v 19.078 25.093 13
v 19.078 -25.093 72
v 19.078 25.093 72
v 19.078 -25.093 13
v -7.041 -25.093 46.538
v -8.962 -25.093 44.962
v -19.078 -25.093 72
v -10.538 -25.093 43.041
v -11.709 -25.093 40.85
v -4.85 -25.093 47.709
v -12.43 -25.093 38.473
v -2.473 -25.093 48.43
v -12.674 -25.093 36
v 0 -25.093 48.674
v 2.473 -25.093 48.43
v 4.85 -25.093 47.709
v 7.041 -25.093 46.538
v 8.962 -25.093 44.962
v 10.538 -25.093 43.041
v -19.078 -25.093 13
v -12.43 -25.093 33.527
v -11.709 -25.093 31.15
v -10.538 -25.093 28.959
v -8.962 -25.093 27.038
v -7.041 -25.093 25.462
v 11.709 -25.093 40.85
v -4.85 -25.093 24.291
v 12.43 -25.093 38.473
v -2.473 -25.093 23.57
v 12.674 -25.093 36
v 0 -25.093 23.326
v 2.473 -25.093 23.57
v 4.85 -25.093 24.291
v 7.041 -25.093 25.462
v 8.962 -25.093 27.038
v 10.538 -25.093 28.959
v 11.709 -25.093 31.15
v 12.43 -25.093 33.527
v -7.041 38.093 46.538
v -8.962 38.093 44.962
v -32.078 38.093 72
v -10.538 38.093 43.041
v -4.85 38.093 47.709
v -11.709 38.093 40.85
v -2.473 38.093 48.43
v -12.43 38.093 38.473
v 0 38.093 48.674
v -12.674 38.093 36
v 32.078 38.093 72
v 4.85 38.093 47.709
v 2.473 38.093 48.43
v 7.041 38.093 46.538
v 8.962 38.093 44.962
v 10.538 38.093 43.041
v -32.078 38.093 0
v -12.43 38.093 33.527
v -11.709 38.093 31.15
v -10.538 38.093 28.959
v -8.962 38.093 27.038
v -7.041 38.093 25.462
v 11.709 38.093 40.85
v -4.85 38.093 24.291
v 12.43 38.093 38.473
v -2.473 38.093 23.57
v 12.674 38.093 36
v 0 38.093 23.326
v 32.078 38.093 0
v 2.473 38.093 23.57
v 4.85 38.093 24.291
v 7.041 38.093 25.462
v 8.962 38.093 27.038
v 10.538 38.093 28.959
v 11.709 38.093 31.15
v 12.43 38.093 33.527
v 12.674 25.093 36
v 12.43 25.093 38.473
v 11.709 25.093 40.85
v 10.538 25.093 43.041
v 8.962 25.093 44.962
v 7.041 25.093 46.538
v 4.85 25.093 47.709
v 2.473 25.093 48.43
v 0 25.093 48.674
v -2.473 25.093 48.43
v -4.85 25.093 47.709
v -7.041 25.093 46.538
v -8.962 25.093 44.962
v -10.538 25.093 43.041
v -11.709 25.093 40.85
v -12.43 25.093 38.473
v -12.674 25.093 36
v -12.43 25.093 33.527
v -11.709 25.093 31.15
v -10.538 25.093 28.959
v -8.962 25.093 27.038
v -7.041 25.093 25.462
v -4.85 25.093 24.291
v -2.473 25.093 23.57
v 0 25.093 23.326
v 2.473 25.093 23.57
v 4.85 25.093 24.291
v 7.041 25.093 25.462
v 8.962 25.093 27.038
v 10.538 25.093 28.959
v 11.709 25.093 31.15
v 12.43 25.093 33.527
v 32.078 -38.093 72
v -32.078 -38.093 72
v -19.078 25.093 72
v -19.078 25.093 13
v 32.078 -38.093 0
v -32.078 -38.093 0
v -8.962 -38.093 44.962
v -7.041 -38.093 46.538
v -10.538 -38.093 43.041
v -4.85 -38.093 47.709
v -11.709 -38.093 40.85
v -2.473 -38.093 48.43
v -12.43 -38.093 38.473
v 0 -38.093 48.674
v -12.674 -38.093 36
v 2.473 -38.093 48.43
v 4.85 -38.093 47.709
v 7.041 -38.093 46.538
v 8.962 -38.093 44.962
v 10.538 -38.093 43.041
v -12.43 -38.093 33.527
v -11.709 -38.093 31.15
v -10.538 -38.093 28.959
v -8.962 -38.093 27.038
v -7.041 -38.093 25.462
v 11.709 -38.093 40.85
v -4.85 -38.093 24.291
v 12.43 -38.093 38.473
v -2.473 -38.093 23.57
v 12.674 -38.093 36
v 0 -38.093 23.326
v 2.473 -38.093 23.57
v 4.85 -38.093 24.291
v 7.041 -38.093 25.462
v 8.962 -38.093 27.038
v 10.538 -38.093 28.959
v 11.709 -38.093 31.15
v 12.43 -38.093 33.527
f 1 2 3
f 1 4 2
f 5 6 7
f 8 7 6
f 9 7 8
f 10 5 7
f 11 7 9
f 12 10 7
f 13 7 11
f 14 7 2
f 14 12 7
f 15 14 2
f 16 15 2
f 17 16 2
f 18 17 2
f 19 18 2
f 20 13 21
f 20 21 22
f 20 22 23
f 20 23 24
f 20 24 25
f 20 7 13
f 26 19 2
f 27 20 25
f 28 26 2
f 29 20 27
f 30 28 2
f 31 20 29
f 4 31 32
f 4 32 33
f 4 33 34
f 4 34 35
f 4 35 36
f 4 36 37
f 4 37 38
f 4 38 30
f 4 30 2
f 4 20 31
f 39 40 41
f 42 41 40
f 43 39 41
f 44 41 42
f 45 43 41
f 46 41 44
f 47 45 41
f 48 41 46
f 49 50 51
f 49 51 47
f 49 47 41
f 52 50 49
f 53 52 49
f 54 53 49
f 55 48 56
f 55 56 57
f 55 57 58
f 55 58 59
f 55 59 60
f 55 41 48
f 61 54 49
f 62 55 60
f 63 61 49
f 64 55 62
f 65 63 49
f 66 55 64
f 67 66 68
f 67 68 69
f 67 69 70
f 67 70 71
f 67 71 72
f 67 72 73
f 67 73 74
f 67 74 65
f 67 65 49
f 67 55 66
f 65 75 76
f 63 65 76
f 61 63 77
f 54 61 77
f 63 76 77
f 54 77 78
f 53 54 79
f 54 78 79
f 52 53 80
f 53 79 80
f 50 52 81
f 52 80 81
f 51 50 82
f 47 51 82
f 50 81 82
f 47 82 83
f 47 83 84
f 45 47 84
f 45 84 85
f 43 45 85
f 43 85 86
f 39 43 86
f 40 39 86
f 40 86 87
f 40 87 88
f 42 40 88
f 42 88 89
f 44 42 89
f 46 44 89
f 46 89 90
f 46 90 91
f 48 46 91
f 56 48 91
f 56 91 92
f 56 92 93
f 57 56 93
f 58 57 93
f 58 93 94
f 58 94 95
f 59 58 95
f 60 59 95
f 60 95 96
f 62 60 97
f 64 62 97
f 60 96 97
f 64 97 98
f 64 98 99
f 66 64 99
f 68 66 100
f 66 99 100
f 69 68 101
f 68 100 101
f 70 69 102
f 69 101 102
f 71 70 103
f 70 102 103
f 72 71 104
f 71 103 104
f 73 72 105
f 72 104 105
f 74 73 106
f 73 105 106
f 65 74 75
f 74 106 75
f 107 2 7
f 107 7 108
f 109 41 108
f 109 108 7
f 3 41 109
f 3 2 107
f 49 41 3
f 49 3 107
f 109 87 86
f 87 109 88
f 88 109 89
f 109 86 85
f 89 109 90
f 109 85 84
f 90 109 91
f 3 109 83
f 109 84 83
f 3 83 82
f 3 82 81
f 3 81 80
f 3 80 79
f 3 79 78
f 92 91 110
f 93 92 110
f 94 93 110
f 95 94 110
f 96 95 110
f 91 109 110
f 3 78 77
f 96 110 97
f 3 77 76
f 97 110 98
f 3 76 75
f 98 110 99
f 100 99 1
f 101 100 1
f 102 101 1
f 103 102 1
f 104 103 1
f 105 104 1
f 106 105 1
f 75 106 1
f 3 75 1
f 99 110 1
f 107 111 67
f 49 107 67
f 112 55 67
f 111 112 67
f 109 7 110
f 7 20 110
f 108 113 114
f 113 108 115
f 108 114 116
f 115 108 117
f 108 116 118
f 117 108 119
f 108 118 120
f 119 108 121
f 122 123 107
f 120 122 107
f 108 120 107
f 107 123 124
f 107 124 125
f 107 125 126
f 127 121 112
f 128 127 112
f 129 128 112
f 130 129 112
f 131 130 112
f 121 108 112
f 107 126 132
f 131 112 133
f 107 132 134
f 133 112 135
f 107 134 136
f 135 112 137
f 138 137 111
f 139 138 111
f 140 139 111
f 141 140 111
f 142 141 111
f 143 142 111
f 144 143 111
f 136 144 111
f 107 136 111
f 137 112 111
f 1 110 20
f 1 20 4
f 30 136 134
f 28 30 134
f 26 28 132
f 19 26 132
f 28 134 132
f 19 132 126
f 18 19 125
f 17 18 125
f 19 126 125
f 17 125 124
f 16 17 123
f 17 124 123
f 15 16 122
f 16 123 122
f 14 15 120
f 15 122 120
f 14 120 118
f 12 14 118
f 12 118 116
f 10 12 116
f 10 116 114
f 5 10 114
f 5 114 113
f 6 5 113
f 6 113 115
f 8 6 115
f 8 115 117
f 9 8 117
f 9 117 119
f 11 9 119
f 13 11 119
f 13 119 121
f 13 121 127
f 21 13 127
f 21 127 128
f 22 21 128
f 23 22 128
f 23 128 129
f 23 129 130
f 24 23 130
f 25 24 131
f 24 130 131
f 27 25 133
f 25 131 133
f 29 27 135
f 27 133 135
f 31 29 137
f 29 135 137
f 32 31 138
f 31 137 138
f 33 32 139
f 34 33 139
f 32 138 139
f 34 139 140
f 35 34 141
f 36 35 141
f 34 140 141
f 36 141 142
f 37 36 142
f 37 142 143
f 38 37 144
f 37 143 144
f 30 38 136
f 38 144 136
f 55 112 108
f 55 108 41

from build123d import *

# Parameters (mm, degrees)
F0_W     = 64.15522
F0_H     = 76.186978
F1_DEPTH = 72
F2_T     = -13
F3_R     = 12.673709
F4_DEPTH = 108.5


with BuildPart() as f1:
    # F0 (on Top) → F1 (new body)
    with BuildSketch(Plane.XY):
        Rectangle(F0_W, F0_H)
    extrude(amount=F1_DEPTH)

    # F2
    f2_openings = [f1.faces().sort_by_distance(p)[0] for p in [
        (0, 0, 72),
    ]]
    offset(amount=F2_T, openings=f2_openings)

    # F3 (on face) → F4 (cut)
    with BuildSketch(Plane.XZ.offset(38.093489)):
        with Locations((0, 36)):
            Circle(F3_R)
    extrude(amount=-F4_DEPTH, mode=Mode.SUBTRACT)


solid = f1.part
